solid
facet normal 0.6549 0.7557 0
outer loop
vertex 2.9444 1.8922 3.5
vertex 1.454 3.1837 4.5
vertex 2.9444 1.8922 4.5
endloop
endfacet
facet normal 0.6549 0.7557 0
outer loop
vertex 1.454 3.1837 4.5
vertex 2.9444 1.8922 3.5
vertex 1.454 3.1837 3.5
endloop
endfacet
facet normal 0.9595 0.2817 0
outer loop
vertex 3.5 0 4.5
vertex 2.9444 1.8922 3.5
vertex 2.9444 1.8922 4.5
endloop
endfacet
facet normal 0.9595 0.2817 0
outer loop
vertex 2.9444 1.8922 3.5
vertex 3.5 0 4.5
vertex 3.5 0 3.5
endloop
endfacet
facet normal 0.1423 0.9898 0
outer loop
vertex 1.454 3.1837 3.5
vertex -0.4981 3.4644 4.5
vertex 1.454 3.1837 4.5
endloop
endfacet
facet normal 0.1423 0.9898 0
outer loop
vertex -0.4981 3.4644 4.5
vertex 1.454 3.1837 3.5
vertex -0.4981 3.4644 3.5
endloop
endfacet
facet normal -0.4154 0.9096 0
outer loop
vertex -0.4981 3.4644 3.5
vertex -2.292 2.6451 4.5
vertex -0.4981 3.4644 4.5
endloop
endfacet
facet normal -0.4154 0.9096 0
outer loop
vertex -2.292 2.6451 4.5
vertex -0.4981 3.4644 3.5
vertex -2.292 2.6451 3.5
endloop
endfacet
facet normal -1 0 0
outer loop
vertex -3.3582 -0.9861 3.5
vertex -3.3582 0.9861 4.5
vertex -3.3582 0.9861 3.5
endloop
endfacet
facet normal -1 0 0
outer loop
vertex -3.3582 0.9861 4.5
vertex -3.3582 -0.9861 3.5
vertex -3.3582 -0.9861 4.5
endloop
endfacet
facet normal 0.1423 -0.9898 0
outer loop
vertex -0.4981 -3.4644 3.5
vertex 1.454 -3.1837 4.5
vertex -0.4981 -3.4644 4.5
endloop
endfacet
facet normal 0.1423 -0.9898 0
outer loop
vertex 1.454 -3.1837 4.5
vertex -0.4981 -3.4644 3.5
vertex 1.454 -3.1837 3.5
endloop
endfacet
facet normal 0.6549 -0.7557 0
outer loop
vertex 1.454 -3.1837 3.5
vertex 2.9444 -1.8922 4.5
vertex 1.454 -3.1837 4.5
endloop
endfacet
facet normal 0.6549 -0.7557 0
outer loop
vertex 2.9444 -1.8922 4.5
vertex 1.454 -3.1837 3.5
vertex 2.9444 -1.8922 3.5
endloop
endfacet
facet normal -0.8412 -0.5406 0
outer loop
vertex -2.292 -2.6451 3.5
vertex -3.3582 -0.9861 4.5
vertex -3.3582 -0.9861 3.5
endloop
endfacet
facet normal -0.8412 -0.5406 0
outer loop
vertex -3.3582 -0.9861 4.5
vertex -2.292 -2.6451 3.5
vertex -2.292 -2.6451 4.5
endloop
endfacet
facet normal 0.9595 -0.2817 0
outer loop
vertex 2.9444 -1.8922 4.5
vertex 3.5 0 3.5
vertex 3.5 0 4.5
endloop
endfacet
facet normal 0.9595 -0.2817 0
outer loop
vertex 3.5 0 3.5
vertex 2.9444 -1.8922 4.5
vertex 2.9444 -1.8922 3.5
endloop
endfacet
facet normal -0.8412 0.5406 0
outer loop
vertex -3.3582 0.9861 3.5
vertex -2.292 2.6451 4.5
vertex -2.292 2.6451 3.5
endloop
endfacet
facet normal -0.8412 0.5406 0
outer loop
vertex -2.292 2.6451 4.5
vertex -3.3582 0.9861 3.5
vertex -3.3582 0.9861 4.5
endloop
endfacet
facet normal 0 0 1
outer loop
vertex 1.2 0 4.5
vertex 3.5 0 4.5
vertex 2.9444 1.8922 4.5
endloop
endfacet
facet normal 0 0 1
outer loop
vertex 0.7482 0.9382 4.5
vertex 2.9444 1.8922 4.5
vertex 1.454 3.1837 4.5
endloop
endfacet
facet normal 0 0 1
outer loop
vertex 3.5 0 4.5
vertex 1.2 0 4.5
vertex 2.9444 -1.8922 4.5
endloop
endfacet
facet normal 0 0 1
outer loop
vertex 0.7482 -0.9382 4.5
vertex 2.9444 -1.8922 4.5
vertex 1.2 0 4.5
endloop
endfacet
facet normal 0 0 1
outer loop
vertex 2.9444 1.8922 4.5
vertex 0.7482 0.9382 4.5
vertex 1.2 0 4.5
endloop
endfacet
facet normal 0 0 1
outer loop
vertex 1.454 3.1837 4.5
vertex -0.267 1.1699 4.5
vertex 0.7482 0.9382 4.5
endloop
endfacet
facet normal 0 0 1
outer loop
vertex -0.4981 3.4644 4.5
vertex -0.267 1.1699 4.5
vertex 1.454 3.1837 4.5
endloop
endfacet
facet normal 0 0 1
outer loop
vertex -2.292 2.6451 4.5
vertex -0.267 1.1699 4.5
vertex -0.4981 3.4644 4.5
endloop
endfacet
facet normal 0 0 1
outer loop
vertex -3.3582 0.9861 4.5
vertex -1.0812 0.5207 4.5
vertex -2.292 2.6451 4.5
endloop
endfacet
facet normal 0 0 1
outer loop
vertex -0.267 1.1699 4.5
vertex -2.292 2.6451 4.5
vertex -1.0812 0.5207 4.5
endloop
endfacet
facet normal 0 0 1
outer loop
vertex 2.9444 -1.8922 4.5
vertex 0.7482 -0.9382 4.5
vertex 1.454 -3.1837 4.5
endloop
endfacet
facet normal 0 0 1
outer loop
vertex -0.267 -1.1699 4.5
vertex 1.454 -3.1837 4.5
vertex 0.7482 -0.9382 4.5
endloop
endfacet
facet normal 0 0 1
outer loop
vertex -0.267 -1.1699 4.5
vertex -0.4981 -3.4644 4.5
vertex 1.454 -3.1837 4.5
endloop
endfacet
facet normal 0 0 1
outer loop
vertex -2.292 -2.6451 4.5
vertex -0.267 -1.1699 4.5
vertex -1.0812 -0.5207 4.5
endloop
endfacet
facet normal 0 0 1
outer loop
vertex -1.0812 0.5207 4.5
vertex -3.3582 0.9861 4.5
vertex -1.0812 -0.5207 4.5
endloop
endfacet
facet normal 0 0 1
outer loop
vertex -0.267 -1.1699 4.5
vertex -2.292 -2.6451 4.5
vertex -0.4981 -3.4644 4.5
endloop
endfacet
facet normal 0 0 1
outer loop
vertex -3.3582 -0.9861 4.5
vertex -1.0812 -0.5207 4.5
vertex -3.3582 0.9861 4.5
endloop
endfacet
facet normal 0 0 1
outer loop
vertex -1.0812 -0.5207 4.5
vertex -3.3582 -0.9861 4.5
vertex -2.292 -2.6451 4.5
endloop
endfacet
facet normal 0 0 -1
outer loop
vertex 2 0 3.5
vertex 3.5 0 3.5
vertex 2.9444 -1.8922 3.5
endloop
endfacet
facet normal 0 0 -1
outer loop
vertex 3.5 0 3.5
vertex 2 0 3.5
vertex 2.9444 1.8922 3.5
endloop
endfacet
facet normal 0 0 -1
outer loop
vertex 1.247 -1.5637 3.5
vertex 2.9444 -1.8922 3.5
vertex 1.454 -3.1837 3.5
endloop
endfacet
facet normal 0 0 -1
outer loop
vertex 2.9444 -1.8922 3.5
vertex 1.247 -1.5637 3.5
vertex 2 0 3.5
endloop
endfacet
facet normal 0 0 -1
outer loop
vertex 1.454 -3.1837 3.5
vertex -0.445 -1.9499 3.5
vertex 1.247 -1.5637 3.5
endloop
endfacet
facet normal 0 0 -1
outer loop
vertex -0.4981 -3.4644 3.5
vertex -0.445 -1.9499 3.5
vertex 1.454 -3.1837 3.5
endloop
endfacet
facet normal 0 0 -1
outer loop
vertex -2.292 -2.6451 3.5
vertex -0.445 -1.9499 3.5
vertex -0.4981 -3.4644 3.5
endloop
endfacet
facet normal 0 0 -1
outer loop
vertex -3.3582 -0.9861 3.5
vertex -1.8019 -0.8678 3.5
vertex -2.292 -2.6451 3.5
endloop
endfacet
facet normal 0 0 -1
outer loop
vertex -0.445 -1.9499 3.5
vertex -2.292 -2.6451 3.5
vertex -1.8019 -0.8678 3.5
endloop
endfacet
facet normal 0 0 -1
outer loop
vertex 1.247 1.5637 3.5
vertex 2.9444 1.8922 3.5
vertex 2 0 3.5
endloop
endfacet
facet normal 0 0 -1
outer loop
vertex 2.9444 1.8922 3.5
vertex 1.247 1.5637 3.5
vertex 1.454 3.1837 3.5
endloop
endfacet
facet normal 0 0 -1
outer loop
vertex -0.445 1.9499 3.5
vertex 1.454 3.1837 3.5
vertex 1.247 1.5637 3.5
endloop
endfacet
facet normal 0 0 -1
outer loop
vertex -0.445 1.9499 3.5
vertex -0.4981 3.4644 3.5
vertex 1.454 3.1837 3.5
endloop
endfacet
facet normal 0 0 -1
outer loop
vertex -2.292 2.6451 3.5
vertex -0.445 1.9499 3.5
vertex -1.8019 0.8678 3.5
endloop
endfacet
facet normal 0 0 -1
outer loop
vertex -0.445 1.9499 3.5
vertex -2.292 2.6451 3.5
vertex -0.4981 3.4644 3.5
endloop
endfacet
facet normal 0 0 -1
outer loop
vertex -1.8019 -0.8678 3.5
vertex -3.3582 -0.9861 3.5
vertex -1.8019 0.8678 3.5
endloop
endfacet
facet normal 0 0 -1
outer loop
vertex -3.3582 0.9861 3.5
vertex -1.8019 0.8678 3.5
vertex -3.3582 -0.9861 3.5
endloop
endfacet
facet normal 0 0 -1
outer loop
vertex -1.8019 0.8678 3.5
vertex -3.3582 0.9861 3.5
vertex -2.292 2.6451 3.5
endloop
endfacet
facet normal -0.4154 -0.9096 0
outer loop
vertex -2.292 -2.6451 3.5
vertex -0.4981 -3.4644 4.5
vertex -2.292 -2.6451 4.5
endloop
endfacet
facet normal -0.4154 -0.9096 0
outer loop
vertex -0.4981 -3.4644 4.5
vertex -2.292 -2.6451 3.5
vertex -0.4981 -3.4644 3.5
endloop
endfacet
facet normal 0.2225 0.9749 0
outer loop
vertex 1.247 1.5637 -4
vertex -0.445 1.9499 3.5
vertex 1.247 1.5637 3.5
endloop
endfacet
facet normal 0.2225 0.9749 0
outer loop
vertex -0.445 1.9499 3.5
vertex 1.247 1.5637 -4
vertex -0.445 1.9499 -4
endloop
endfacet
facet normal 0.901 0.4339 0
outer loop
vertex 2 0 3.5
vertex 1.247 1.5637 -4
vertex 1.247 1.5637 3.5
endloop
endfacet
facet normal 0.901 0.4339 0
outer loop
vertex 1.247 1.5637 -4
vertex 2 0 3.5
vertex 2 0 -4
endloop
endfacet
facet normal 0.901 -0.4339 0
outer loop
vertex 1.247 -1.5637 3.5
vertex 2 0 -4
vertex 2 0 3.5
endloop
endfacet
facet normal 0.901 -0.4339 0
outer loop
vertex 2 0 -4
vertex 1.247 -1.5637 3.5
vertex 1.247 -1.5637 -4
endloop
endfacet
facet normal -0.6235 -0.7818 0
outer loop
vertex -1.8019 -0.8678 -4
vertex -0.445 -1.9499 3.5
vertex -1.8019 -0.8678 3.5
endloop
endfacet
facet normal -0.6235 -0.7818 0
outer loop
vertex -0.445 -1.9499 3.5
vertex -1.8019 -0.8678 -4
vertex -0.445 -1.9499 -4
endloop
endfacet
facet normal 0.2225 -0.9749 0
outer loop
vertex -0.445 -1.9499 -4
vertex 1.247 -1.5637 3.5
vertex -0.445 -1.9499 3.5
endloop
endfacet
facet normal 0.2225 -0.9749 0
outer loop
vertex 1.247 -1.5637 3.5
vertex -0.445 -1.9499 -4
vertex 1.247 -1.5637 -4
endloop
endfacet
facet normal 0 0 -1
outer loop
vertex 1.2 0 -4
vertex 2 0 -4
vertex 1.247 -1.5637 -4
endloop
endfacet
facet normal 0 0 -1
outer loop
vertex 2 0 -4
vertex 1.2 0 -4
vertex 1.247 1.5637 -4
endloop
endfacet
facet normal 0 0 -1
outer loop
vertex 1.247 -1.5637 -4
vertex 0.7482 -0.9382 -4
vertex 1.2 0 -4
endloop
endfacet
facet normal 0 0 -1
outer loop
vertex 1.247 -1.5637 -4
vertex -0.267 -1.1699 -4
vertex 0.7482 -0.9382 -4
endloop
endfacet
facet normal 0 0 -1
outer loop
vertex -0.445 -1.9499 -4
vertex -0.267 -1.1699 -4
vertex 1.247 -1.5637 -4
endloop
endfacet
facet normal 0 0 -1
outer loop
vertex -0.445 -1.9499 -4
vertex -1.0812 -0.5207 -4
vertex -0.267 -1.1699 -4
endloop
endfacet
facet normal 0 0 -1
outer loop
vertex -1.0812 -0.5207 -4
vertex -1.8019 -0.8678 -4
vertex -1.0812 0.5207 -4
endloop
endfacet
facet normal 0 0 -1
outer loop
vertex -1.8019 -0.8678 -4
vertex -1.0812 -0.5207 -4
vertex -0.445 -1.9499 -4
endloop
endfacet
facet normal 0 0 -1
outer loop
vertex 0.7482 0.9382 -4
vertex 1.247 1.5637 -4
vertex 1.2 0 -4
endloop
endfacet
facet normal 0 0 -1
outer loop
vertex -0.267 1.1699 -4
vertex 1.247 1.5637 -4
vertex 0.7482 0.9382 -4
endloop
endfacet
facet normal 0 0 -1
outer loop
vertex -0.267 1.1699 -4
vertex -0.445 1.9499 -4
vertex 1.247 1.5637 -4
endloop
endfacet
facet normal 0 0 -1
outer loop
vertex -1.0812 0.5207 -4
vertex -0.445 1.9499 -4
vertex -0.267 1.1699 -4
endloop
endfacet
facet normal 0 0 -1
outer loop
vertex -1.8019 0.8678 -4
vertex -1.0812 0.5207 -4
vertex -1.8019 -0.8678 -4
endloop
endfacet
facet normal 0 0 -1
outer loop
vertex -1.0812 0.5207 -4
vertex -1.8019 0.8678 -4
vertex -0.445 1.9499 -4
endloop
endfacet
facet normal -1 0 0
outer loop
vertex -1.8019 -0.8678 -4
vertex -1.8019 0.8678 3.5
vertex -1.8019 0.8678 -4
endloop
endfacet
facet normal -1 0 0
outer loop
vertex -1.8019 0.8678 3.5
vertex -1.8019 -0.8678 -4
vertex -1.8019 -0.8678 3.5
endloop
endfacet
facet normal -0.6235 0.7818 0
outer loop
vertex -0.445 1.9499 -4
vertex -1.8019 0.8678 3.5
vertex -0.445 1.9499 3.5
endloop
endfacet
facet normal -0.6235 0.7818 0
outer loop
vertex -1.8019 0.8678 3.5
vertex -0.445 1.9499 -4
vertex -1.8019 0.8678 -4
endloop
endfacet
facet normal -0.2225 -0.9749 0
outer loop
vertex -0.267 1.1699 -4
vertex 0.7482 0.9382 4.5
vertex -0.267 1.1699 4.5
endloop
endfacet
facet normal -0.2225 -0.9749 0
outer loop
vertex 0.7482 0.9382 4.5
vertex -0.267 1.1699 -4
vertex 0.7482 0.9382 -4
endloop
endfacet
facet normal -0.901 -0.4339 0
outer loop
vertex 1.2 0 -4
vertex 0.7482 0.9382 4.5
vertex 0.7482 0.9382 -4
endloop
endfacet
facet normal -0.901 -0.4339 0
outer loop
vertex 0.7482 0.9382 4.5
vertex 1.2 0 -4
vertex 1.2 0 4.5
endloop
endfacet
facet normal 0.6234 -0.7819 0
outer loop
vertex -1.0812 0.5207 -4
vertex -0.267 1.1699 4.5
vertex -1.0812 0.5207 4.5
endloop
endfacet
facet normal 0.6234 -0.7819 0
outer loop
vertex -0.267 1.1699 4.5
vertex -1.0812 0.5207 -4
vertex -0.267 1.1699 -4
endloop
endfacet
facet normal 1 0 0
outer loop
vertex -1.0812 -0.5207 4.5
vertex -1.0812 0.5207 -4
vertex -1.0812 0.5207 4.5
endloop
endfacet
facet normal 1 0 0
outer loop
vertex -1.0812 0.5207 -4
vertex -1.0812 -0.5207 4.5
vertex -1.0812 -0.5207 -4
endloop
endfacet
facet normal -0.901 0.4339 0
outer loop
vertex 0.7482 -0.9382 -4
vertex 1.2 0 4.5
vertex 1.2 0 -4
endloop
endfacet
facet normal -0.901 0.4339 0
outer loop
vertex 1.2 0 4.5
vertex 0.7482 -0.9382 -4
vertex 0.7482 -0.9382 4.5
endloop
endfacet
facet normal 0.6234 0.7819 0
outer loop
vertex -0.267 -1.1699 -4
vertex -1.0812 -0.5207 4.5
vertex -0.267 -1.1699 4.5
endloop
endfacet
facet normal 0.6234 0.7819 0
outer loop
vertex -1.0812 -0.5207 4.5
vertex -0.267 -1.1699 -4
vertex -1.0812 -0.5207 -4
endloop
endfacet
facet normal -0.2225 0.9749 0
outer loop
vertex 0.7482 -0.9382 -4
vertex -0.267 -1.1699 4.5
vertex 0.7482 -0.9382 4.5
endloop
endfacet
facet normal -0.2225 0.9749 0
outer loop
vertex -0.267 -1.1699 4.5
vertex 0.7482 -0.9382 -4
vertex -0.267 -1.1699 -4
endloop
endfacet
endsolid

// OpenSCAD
difference() {
	union() {
		translate([0,0,4])
			cylinder(r=3.5,h=1,center=true);
		cylinder(r=2.0,h=8,center=true);
	}
	cylinder(r=1.2,h=10,center=true,$fn=7);
}
